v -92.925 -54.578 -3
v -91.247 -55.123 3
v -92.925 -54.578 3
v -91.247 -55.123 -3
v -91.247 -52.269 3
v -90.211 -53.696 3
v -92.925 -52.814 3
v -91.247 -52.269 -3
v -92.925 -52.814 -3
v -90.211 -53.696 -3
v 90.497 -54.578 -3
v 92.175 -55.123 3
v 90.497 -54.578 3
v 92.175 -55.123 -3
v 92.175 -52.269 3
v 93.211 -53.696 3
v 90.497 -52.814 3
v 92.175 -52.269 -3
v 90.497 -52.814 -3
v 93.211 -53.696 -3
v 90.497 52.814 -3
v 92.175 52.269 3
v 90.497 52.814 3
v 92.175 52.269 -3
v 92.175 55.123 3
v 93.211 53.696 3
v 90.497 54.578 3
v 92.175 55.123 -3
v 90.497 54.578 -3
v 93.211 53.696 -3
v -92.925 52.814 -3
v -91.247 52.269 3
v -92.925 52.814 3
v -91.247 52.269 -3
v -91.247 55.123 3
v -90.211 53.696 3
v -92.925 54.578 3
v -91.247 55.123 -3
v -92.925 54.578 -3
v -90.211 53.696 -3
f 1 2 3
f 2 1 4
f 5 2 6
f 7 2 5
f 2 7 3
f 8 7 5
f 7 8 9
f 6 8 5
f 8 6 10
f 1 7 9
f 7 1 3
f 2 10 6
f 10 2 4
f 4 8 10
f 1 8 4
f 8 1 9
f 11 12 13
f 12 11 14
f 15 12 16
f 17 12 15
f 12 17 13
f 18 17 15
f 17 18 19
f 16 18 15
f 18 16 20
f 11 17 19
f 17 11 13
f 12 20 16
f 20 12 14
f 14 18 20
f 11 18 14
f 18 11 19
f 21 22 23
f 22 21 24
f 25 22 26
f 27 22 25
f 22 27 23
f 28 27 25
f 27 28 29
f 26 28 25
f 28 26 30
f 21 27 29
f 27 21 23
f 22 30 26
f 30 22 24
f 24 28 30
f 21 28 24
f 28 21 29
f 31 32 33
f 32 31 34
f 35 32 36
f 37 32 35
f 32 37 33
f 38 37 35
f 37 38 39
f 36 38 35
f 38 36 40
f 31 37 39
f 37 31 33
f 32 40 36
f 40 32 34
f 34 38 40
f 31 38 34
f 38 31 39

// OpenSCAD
// file: dimensions.scad
function plate_width() = 193.422;
function plate_height() = 117.392;
function plate_thickness() = 3;
function separation() = 5;
function led_width() = 10;
function led_height() = 2.5;
function hole_radius() = 1.5;
function hole_offset() = 3.5 + hole_radius();
function separator_thickness() = (led_width()-plate_thickness())/2;

function electronics_width() = 81.3;
function electronics_height() = 50.7;
function electronics_thickness() = 23;
// main file
use <dimensions.scad>

thickness = 3;
module negative_screw() {
    translate([-plate_width()/2 + hole_offset(), -plate_height()/2 + hole_offset(), 0])
        cylinder(h = thickness * 2, r = hole_radius(), center=true);
    translate([plate_width()/2 - hole_offset(), -plate_height()/2 + hole_offset(), 0])
        cylinder(h = thickness * 2, r = hole_radius(), center=true);
    translate([plate_width()/2 - hole_offset(), plate_height()/2 - hole_offset(), 0])
        cylinder(h = thickness * 2, r = hole_radius(), center=true);
    translate([-plate_width()/2 + hole_offset(), plate_height()/2 - hole_offset(), 0])
        cylinder(h = thickness * 2, r = hole_radius(), center=true);
}

negative_screw();
